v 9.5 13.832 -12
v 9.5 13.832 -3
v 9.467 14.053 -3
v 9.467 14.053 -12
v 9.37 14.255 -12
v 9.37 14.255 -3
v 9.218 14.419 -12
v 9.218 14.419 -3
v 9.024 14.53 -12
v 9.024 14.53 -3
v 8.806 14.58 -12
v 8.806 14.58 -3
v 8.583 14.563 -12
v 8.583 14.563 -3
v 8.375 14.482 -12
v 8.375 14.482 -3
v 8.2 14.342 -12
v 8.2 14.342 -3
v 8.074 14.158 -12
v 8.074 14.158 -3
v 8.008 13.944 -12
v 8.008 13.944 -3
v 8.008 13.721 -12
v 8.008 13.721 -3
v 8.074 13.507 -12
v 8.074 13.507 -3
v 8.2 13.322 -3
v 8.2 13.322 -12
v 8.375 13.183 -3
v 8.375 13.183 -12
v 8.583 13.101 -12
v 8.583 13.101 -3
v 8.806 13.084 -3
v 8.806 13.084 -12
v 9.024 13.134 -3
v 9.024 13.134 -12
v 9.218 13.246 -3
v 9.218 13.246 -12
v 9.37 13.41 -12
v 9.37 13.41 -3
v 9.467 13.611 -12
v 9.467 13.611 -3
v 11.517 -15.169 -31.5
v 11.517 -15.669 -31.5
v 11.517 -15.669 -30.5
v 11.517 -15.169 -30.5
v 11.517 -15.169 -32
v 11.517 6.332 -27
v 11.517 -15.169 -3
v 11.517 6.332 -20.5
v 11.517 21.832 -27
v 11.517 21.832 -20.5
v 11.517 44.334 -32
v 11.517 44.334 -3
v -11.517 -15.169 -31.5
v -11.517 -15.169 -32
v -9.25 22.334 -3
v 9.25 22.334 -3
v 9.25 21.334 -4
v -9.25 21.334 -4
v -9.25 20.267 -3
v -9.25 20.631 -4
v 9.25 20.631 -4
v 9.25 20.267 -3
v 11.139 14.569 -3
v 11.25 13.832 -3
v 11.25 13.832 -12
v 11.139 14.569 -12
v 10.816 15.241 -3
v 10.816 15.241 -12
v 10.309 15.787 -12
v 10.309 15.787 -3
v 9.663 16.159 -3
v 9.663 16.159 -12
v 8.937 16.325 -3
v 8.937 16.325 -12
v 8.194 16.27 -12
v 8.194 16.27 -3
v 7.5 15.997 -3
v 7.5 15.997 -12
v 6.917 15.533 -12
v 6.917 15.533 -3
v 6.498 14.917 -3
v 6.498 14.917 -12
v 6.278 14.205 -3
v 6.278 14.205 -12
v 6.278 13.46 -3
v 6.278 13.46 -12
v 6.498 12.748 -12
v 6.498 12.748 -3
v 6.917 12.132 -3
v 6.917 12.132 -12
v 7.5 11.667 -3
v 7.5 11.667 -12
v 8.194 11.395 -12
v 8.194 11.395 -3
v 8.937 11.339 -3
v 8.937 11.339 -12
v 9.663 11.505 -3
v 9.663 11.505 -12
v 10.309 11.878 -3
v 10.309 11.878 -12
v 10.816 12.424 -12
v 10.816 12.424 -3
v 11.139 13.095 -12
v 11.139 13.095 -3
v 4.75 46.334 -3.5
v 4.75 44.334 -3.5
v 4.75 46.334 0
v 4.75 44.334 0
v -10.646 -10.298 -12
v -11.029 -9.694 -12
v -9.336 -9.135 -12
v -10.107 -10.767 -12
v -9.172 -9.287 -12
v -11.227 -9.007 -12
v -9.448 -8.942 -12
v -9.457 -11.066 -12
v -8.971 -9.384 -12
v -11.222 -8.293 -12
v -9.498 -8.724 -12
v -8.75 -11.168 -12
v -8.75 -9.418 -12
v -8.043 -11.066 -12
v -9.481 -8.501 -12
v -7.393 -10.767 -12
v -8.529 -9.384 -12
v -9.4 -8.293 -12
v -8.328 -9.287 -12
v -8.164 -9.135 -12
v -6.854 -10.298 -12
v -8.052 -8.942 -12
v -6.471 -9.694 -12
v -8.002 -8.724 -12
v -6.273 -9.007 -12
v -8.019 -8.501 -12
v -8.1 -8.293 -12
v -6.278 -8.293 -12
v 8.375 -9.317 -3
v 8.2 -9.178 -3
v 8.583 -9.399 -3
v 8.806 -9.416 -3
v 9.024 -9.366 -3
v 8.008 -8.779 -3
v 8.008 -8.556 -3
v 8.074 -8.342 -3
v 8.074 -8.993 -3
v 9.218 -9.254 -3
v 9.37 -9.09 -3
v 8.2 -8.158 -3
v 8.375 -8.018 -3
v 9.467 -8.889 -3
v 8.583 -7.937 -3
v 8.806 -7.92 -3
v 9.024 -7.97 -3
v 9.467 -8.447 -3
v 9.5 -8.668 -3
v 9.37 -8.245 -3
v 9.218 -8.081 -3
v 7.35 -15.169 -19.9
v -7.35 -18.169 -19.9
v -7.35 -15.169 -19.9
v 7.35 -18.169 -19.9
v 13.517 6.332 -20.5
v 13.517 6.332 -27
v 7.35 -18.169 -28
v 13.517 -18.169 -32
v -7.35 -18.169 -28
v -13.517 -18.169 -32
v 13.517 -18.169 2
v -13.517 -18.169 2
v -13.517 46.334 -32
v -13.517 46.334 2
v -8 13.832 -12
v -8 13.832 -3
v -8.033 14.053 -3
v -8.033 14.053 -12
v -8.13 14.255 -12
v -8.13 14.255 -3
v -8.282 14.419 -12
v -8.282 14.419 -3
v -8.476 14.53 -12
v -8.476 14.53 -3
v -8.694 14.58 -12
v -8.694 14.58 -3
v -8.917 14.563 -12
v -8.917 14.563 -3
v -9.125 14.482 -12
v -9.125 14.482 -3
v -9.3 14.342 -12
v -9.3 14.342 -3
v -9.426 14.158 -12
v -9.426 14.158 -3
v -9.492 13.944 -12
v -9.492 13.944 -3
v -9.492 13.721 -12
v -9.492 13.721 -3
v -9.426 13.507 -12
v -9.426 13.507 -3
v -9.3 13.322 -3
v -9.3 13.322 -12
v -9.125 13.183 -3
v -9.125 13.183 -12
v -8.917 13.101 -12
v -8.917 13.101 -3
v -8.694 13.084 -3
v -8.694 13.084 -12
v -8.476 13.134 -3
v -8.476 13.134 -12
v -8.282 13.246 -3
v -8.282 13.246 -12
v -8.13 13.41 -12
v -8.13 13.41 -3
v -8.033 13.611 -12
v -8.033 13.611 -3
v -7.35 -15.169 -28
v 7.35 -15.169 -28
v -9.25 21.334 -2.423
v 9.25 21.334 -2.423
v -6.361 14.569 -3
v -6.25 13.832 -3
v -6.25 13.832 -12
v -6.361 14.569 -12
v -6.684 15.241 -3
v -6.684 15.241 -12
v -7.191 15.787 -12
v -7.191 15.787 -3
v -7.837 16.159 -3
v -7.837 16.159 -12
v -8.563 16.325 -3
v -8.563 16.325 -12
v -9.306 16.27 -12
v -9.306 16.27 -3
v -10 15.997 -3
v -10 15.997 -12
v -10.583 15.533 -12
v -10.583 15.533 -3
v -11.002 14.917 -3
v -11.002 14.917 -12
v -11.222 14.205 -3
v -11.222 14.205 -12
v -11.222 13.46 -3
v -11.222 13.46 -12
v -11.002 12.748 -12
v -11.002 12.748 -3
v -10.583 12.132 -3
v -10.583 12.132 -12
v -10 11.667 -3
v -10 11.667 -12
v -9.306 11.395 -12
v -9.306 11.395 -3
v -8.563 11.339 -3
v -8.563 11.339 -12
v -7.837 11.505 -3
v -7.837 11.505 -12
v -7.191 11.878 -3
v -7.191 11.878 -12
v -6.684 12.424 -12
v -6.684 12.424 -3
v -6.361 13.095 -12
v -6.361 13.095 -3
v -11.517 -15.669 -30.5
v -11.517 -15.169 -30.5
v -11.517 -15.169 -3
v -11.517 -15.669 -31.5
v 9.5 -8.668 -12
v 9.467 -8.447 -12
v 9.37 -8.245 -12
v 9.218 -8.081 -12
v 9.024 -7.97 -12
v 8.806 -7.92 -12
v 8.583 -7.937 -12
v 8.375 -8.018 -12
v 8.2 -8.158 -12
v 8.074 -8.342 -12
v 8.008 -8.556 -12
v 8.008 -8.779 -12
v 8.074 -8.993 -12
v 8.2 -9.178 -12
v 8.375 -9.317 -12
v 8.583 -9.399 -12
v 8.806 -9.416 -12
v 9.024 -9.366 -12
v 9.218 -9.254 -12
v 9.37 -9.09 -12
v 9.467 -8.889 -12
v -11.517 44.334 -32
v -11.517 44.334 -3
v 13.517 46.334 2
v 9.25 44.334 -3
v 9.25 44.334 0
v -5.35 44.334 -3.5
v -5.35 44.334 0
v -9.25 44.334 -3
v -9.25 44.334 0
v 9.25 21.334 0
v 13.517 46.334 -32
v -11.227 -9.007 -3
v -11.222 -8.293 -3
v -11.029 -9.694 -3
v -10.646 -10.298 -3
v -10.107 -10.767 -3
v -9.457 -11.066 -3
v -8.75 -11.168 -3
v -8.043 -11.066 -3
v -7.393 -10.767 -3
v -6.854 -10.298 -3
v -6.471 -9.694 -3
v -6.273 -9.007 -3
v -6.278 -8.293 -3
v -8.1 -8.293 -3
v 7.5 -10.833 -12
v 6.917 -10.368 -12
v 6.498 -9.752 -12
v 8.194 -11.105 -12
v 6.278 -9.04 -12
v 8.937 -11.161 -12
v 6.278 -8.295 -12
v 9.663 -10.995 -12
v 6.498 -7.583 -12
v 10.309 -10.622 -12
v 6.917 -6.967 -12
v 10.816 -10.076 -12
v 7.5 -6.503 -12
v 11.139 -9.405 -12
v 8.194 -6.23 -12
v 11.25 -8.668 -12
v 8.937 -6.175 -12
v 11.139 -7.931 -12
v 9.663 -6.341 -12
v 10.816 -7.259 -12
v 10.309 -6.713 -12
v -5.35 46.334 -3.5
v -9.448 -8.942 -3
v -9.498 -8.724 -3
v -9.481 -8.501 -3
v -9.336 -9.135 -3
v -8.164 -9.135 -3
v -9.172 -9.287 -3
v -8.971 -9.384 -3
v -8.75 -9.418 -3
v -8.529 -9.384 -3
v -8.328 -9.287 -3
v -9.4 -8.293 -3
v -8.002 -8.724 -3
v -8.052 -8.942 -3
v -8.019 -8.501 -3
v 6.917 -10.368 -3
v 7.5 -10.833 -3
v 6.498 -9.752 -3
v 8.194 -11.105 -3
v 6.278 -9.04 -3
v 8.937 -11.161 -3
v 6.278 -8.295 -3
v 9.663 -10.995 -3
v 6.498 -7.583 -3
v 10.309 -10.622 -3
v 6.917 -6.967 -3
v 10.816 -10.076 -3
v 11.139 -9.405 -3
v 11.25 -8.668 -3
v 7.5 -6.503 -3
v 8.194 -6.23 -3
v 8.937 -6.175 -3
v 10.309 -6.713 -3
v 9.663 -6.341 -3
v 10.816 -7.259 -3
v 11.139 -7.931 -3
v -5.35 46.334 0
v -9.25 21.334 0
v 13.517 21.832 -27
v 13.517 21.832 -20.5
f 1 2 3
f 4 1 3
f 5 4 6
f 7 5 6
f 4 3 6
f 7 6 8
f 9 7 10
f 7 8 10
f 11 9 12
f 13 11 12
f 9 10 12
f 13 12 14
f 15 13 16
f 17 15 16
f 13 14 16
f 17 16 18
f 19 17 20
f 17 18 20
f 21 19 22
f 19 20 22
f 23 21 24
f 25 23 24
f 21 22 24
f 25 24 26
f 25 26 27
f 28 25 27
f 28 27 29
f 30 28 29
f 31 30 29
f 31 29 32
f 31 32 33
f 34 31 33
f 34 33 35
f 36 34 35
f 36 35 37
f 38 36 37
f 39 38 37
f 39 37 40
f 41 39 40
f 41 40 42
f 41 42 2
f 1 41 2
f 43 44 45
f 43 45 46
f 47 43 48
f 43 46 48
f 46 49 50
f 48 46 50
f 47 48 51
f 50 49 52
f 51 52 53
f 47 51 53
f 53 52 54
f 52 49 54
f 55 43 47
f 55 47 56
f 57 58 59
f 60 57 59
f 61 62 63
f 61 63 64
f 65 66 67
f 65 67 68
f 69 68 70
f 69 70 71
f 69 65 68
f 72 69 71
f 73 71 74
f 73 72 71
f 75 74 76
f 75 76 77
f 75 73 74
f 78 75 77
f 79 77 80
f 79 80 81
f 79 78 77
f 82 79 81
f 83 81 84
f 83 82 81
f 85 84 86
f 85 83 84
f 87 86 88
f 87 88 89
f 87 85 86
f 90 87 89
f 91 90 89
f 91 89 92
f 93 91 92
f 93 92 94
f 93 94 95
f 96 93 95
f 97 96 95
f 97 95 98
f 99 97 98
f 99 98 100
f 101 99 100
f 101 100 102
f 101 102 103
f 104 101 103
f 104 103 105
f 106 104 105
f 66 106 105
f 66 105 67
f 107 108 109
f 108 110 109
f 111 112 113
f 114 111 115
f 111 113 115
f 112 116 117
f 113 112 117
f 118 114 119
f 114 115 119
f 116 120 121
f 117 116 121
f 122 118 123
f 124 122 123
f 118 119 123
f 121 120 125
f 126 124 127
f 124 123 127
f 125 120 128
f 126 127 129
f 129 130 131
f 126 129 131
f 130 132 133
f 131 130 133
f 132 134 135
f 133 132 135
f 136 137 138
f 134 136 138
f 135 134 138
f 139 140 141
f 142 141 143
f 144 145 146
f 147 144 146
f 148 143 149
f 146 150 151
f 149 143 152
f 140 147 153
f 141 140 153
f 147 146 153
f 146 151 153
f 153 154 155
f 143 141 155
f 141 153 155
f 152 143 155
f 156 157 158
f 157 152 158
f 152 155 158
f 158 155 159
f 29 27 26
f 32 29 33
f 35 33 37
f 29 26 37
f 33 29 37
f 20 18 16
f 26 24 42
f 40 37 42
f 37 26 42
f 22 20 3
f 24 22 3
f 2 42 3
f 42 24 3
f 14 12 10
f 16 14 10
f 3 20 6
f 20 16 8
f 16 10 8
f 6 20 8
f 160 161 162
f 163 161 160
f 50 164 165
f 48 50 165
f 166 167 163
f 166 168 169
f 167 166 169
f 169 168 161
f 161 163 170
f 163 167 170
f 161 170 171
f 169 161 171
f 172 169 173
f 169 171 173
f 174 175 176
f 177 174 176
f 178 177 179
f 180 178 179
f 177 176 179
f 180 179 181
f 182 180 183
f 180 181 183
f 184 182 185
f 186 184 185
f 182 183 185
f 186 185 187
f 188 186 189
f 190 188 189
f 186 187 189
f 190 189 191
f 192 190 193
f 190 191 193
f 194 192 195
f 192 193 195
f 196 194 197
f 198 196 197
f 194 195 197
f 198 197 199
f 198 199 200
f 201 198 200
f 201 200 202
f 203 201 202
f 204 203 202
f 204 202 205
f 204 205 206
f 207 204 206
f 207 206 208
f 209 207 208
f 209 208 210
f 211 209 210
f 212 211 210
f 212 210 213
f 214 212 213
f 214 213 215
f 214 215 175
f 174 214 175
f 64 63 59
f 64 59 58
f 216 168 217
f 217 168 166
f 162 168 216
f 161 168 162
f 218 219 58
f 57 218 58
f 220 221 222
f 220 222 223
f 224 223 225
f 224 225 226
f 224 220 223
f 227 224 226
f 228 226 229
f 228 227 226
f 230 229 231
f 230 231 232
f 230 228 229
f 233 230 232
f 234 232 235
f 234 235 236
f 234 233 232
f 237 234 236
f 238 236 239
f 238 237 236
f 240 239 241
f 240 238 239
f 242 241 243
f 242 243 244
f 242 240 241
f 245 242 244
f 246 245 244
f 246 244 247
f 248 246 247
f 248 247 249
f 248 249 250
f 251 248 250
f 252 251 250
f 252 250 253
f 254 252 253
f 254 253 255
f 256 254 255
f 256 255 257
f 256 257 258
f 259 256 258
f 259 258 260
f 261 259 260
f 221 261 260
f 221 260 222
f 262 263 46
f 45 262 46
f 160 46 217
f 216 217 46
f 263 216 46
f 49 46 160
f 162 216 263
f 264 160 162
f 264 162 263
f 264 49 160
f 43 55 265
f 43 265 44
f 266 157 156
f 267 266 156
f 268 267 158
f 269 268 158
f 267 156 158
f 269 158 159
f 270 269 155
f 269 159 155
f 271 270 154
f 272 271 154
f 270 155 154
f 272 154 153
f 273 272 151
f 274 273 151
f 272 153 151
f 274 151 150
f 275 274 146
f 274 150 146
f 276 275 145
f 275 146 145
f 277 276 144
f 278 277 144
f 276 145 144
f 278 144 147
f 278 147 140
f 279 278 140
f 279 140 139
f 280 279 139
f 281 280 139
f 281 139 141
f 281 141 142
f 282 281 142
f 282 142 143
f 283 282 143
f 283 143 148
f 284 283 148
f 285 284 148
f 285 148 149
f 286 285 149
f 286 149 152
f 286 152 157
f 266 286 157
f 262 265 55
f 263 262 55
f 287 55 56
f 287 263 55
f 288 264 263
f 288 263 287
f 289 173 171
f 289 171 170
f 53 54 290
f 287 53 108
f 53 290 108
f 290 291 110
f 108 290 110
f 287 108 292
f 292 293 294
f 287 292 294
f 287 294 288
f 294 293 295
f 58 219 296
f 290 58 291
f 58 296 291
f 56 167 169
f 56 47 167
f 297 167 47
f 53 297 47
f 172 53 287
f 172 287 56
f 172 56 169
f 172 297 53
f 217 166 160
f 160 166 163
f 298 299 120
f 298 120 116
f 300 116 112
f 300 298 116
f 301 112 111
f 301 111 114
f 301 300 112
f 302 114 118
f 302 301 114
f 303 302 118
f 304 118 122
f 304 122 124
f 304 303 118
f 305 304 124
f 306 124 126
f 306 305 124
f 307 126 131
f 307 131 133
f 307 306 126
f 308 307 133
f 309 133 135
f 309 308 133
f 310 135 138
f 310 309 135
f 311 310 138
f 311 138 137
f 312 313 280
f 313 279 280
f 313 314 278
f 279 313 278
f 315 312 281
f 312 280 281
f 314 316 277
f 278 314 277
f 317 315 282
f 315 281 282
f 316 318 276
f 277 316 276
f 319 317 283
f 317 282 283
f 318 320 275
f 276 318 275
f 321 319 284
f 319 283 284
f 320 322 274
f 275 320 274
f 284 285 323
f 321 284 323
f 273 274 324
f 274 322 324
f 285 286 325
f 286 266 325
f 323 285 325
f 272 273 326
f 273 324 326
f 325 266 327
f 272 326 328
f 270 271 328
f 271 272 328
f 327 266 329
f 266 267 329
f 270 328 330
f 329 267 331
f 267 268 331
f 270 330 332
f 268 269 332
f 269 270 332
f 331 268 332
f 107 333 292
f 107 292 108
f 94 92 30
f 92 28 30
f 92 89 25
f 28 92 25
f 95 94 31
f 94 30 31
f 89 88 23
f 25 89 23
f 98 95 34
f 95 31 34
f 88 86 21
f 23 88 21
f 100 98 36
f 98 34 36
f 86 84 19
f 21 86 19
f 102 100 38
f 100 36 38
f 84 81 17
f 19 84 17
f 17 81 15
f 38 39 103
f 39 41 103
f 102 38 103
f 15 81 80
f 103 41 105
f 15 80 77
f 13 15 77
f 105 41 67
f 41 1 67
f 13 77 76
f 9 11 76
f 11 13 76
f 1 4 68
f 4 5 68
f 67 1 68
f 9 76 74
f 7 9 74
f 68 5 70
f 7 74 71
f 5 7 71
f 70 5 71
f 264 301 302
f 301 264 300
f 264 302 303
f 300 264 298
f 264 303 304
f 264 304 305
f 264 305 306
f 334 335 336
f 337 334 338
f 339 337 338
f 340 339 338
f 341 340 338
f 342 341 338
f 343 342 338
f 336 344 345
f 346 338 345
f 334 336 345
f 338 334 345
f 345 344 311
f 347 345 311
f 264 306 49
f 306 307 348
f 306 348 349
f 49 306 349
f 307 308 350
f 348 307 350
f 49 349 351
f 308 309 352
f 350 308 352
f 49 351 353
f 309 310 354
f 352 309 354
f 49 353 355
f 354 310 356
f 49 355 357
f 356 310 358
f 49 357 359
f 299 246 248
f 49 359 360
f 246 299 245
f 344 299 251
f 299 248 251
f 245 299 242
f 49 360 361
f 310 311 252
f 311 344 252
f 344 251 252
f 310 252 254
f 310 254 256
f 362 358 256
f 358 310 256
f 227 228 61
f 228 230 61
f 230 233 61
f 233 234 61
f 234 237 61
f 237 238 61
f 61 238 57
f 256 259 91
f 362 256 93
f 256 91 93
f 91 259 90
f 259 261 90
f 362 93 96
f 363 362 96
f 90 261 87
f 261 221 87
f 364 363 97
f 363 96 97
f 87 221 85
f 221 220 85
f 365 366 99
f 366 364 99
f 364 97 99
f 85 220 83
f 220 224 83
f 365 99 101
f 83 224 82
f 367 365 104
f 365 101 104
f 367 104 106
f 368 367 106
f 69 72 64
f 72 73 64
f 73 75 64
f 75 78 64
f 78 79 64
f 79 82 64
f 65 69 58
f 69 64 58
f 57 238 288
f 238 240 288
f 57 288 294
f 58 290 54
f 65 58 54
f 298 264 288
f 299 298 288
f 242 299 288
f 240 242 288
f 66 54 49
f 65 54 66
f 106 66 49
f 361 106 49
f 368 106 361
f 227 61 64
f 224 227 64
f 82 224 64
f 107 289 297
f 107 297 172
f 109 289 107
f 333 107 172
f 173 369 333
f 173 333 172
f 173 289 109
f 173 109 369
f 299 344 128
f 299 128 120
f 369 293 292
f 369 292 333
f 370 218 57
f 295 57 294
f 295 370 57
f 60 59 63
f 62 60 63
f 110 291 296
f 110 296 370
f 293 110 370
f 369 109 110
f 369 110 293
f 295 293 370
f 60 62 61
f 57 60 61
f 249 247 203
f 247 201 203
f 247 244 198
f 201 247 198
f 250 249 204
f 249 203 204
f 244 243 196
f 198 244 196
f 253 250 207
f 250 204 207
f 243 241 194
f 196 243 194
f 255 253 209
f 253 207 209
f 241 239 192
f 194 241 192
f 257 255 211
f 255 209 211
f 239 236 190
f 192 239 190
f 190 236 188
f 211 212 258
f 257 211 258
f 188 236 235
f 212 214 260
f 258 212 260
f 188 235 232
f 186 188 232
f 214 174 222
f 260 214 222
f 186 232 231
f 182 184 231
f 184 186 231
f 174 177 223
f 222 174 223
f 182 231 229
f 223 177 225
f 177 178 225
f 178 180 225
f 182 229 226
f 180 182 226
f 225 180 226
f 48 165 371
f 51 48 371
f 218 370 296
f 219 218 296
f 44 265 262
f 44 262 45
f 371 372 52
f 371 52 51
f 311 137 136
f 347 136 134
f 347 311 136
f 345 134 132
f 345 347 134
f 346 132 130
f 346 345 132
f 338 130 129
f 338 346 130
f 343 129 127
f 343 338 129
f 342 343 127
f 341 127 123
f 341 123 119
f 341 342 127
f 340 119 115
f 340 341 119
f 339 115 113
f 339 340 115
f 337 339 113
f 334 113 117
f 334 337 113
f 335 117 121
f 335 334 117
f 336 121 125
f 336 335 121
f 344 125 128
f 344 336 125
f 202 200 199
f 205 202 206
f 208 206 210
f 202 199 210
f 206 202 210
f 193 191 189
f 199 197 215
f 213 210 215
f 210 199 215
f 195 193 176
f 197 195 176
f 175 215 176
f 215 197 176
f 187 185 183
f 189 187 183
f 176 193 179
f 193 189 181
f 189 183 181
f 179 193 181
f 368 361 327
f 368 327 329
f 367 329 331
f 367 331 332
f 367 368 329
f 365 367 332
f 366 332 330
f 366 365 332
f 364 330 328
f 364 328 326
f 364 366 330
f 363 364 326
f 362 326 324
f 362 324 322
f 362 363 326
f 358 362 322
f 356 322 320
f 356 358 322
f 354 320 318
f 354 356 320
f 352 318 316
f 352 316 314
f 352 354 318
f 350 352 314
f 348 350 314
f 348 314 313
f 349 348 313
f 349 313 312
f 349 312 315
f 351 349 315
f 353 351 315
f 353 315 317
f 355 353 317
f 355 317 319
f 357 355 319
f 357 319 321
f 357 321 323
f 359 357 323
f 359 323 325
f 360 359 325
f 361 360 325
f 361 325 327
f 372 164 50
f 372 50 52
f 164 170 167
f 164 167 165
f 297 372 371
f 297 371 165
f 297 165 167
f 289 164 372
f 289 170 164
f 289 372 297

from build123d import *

# Parameters (mm, degrees)
SKETCH1_3_W         = 27.034600944
SKETCH1_3_H         = 64.50289226
BOSS_EXTRUDE2_DEPTH = 2
SKETCH1_4_W         = 27.034600944
SKETCH1_4_H         = 64.50289226
SKETCH1_4_R         = 2.5
SKETCH1_4_W_2       = 18.5
SKETCH1_4_H_2       = 23
SKETCH1_4_R_2       = 0.75
BOSS_EXTRUDE3_DEPTH = 3
SKETCH1_R           = 2.5
SKETCH1_R_2         = 0.75
BOSS_EXTRUDE6_DEPTH = 12
CUT_EXTRUDE1_START  = -3
SKETCH2_W           = 10.1
SKETCH2_H           = 7
SKETCH2_H_2         = 5.610263073
CUT_EXTRUDE1_DEPTH  = 3.5
BOSS_EXTRUDE7_DEPTH = 18.5
SKETCH5_W           = 27.034600944
SKETCH5_H           = 64.50289226
SKETCH5_W_2         = 23.034600944
SKETCH5_H_2         = 59.50289226
BOSS_EXTRUDE9_DEPTH = 29
SKETCH6_W           = 23.034600944
SKETCH6_H           = 1
CUT_EXTRUDE2_DEPTH  = 0.5
CUT_EXTRUDE3_REACH  = 75.262
SKETCH8_W           = 14.7
SKETCH8_H           = 8.1
CUT_EXTRUDE4_REACH  = 64.464
SKETCH9_W           = 6.5
SKETCH9_H           = 15.5
SKETCH11_W          = 10.1
SKETCH11_H          = 2
CUT_EXTRUDE5_DEPTH  = 0.5


with BuildPart() as part:
    # Sketch1<3> → Boss-Extrude2 (new body)
    with BuildSketch(Plane.XY):
        with Locations((0, 14.082400554)):
            Rectangle(SKETCH1_3_W, SKETCH1_3_H)
    extrude(amount=BOSS_EXTRUDE2_DEPTH)

    # Sketch1<4> → Boss-Extrude3 (add)
    # profile 1 of 15: a face of its own
    with BuildSketch(Plane.XY):
        with Locations((0, 14.082400554)):
            Rectangle(SKETCH1_4_W, SKETCH1_4_H)
        with Locations((-8.75, -8.667715428)):
            Circle(SKETCH1_4_R, mode=Mode.SUBTRACT)
        with Locations((8.75, -8.667715428)):
            Circle(SKETCH1_4_R, mode=Mode.SUBTRACT)
        with Locations((8.75, 13.832284572)):
            Circle(SKETCH1_4_R, mode=Mode.SUBTRACT)
        with Locations((-8.75, 13.832284572)):
            Circle(SKETCH1_4_R, mode=Mode.SUBTRACT)
        with Locations((0, 32.833846684)):
            Rectangle(SKETCH1_4_W_2, SKETCH1_4_H_2, mode=Mode.SUBTRACT)
    # profile 2 of 15: a face of its own
    with BuildSketch(Plane.XY):
        with Locations((8.75, 13.832284572)):
            Circle(SKETCH1_4_R)
        with Locations((8.75, 13.832284572)):
            Circle(SKETCH1_4_R_2, mode=Mode.SUBTRACT)
    # profile 3 of 15: a face of its own
    with BuildSketch(Plane.XY):
        with Locations((8.75, 13.832284572)):
            Circle(SKETCH1_4_R_2)
    # profile 4 of 15: a face of its own
    with BuildSketch(Plane.XY):
        with Locations((-8.75, 13.832284572)):
            Circle(SKETCH1_4_R)
        with Locations((-8.75, 13.832284572)):
            Circle(SKETCH1_4_R_2, mode=Mode.SUBTRACT)
    # profile 5 of 15: a face of its own
    with BuildSketch(Plane.XY):
        with Locations((-8.75, 13.832284572)):
            Circle(SKETCH1_4_R_2)
    # profile 6 of 15: a face of its own
    with BuildSketch(Plane.XY):
        with BuildLine():
            ThreePointArc((-6.278285008, -8.292715428), (-8.75, -6.167715428), (-11.221714992, -8.292715428))
            Line((-11.221714992, -8.292715428), (-9.399519053, -8.292715428))
            ThreePointArc((-9.399519053, -8.292715428), (-8.75, -7.917715428), (-8.100480947, -8.292715428))
            Line((-8.100480947, -8.292715428), (-6.278285008, -8.292715428))
        make_face()
    # profile 7 of 15: a face of its own
    with BuildSketch(Plane.XY):
        with BuildLine():
            Line((-9.399519053, -8.292715428), (-11.221714992, -8.292715428))
            ThreePointArc((-11.221714992, -8.292715428), (-8.938032605, -11.160634147), (-6.25, -8.667715428))
            ThreePointArc((-6.25, -8.667715428), (-6.257081281, -8.479682824), (-6.278285008, -8.292715428))
            Line((-6.278285008, -8.292715428), (-8.100480947, -8.292715428))
            ThreePointArc((-8.100480947, -8.292715428), (-8.02555563, -8.473601145), (-8, -8.667715428))
            ThreePointArc((-8, -8.667715428), (-8.944114284, -9.392159798), (-9.399519053, -8.292715428))
        make_face()
    # profile 8 of 15: a face of its own
    with BuildSketch(Plane.XY):
        with BuildLine():
            ThreePointArc((-8.100480947, -8.292715428), (-8.75, -7.917715428), (-9.399519053, -8.292715428))
            Line((-9.399519053, -8.292715428), (-8.100480947, -8.292715428))
        make_face()
    # profile 9 of 15: a face of its own
    with BuildSketch(Plane.XY):
        with BuildLine():
            Line((-8.100480947, -8.292715428), (-9.399519053, -8.292715428))
            ThreePointArc((-9.399519053, -8.292715428), (-8.944114284, -9.392159798), (-8, -8.667715428))
            ThreePointArc((-8, -8.667715428), (-8.02555563, -8.473601145), (-8.100480947, -8.292715428))
        make_face()
    # profile 10 of 15: a face of its own
    with BuildSketch(Plane.XY):
        with BuildLine():
            ThreePointArc((-6.278285008, -8.292715428), (-8.75, -6.167715428), (-11.221714992, -8.292715428))
            Line((-11.221714992, -8.292715428), (-9.399519053, -8.292715428))
            ThreePointArc((-9.399519053, -8.292715428), (-8.75, -7.917715428), (-8.100480947, -8.292715428))
            Line((-8.100480947, -8.292715428), (-6.278285008, -8.292715428))
        make_face()
    # profile 11 of 15: a face of its own
    with BuildSketch(Plane.XY):
        with BuildLine():
            Line((-9.399519053, -8.292715428), (-11.221714992, -8.292715428))
            ThreePointArc((-11.221714992, -8.292715428), (-8.938032605, -11.160634147), (-6.25, -8.667715428))
            ThreePointArc((-6.25, -8.667715428), (-6.257081281, -8.479682824), (-6.278285008, -8.292715428))
            Line((-6.278285008, -8.292715428), (-8.100480947, -8.292715428))
            ThreePointArc((-8.100480947, -8.292715428), (-8.02555563, -8.473601145), (-8, -8.667715428))
            ThreePointArc((-8, -8.667715428), (-8.944114284, -9.392159798), (-9.399519053, -8.292715428))
        make_face()
    # profile 12 of 15: a face of its own
    with BuildSketch(Plane.XY):
        with BuildLine():
            ThreePointArc((-8.100480947, -8.292715428), (-8.75, -7.917715428), (-9.399519053, -8.292715428))
            Line((-9.399519053, -8.292715428), (-8.100480947, -8.292715428))
        make_face()
    # profile 13 of 15: a face of its own
    with BuildSketch(Plane.XY):
        with BuildLine():
            Line((-8.100480947, -8.292715428), (-9.399519053, -8.292715428))
            ThreePointArc((-9.399519053, -8.292715428), (-8.944114284, -9.392159798), (-8, -8.667715428))
            ThreePointArc((-8, -8.667715428), (-8.02555563, -8.473601145), (-8.100480947, -8.292715428))
        make_face()
    # profile 14 of 15: a face of its own
    with BuildSketch(Plane.XY):
        with Locations((8.75, -8.667715428)):
            Circle(SKETCH1_4_R)
        with Locations((8.75, -8.667715428)):
            Circle(SKETCH1_4_R_2, mode=Mode.SUBTRACT)
    # profile 15 of 15: a face of its own
    with BuildSketch(Plane.XY):
        with Locations((8.75, -8.667715428)):
            Circle(SKETCH1_4_R_2)
    extrude(amount=-BOSS_EXTRUDE3_DEPTH)

    # Sketch1 → Boss-Extrude6 (add)
    # profile 1 of 4: a face of its own
    with BuildSketch(Plane.XY):
        with BuildLine():
            Line((-9.399519053, -8.292715428), (-11.221714992, -8.292715428))
            ThreePointArc((-11.221714992, -8.292715428), (-8.75, -11.167715428), (-6.278285008, -8.292715428))
            Line((-6.278285008, -8.292715428), (-8.100480947, -8.292715428))
            ThreePointArc((-8.100480947, -8.292715428), (-8.75, -9.417715428), (-9.399519053, -8.292715428))
        make_face()
    # profile 2 of 4: a face of its own
    with BuildSketch(Plane.XY):
        with Locations((-8.75, 13.832284572)):
            Circle(SKETCH1_R)
        with Locations((-8.75, 13.832284572)):
            Circle(SKETCH1_R_2, mode=Mode.SUBTRACT)
    # profile 3 of 4: a face of its own
    with BuildSketch(Plane.XY):
        with Locations((8.75, 13.832284572)):
            Circle(SKETCH1_R)
        with Locations((8.75, 13.832284572)):
            Circle(SKETCH1_R_2, mode=Mode.SUBTRACT)
    # profile 4 of 4: a face of its own
    with BuildSketch(Plane.XY):
        with Locations((8.75, -8.667715428)):
            Circle(SKETCH1_R)
        with Locations((8.75, -8.667715428)):
            Circle(SKETCH1_R_2, mode=Mode.SUBTRACT)
    extrude(amount=-BOSS_EXTRUDE6_DEPTH)

    # Sketch2 → Cut-Extrude1 (cut)
    with BuildSketch(Plane(origin=(0, 0, -3), x_dir=(-1, 0, 0), z_dir=(0, 0, -1)).offset(CUT_EXTRUDE1_START)):
        with Locations((0.3, 40.833846684)):
            Rectangle(SKETCH2_W, SKETCH2_H)
        with Locations((0.3, 47.138978221)):
            Rectangle(SKETCH2_W, SKETCH2_H_2)
    extrude(amount=CUT_EXTRUDE1_DEPTH, mode=Mode.SUBTRACT)

    # Sketch4 → Boss-Extrude7 (add)
    with BuildSketch(Plane.ZY.offset(-9.25)):
        Polygon((-3, 22.333846684), (-3, 21.333846684), (-2.422649731, 21.333846684), align=None)
        Polygon((-3, 20.267009218), (-3, 21.333846684), (-3, 22.333846684), (-4, 21.333846684), (-4, 20.630979452), align=None)
    extrude(amount=BOSS_EXTRUDE7_DEPTH)

    # Sketch5 → Boss-Extrude9 (add)
    with BuildSketch(Plane(origin=(0, 0, -3), x_dir=(-1, 0, 0), z_dir=(0, 0, -1))):
        with Locations((0, 14.082400554)):
            Rectangle(SKETCH5_W, SKETCH5_H)
        with Locations((0, 14.582400554)):
            Rectangle(SKETCH5_W_2, SKETCH5_H_2, mode=Mode.SUBTRACT)
    extrude(amount=BOSS_EXTRUDE9_DEPTH)

    # Sketch6 → Cut-Extrude2 (cut)
    with BuildSketch(Plane(origin=(0, -15.169045576, 0), x_dir=(1, 0, 0), z_dir=(0, 1, 0))):
        with Locations((0, 31)):
            Rectangle(SKETCH6_W, SKETCH6_H)
    extrude(amount=-CUT_EXTRUDE2_DEPTH, mode=Mode.SUBTRACT)

    # Sketch8 → Cut-Extrude3 (cut, up to next)
    with BuildSketch(Plane.XZ.offset(18.169045576), mode=Mode.PRIVATE) as cut_extrude3_sk1:
        with Locations((0, -23.95)):
            Rectangle(SKETCH8_W, SKETCH8_H)
    cut_extrude3_tool1 = extrude(cut_extrude3_sk1.sketch, amount=-CUT_EXTRUDE3_REACH, mode=Mode.PRIVATE) & part.part
    add(cut_extrude3_tool1.solids().sort_by_distance((0, -18.169046, -23.95))[0], mode=Mode.SUBTRACT)

    # Sketch9 → Cut-Extrude4 (cut, up to next)
    with BuildSketch(Plane(origin=(13.517300472, 0, 0), x_dir=(0, 0, -1), z_dir=(1, 0, 0)), mode=Mode.PRIVATE) as cut_extrude4_sk1:
        with Locations((23.75, 14.082400554)):
            Rectangle(SKETCH9_W, SKETCH9_H)
    cut_extrude4_tool1 = extrude(cut_extrude4_sk1.sketch, amount=-CUT_EXTRUDE4_REACH, mode=Mode.PRIVATE) & part.part
    add(cut_extrude4_tool1.solids().sort_by_distance((13.5173, 14.082401, -23.75))[0], mode=Mode.SUBTRACT)

    # Sketch11 → Cut-Extrude5 (cut)
    with BuildSketch(Plane.XY.offset(-3)):
        with Locations((-0.3, 45.333846684)):
            Rectangle(SKETCH11_W, SKETCH11_H)
    extrude(amount=-CUT_EXTRUDE5_DEPTH, mode=Mode.SUBTRACT)


solid = part.part
